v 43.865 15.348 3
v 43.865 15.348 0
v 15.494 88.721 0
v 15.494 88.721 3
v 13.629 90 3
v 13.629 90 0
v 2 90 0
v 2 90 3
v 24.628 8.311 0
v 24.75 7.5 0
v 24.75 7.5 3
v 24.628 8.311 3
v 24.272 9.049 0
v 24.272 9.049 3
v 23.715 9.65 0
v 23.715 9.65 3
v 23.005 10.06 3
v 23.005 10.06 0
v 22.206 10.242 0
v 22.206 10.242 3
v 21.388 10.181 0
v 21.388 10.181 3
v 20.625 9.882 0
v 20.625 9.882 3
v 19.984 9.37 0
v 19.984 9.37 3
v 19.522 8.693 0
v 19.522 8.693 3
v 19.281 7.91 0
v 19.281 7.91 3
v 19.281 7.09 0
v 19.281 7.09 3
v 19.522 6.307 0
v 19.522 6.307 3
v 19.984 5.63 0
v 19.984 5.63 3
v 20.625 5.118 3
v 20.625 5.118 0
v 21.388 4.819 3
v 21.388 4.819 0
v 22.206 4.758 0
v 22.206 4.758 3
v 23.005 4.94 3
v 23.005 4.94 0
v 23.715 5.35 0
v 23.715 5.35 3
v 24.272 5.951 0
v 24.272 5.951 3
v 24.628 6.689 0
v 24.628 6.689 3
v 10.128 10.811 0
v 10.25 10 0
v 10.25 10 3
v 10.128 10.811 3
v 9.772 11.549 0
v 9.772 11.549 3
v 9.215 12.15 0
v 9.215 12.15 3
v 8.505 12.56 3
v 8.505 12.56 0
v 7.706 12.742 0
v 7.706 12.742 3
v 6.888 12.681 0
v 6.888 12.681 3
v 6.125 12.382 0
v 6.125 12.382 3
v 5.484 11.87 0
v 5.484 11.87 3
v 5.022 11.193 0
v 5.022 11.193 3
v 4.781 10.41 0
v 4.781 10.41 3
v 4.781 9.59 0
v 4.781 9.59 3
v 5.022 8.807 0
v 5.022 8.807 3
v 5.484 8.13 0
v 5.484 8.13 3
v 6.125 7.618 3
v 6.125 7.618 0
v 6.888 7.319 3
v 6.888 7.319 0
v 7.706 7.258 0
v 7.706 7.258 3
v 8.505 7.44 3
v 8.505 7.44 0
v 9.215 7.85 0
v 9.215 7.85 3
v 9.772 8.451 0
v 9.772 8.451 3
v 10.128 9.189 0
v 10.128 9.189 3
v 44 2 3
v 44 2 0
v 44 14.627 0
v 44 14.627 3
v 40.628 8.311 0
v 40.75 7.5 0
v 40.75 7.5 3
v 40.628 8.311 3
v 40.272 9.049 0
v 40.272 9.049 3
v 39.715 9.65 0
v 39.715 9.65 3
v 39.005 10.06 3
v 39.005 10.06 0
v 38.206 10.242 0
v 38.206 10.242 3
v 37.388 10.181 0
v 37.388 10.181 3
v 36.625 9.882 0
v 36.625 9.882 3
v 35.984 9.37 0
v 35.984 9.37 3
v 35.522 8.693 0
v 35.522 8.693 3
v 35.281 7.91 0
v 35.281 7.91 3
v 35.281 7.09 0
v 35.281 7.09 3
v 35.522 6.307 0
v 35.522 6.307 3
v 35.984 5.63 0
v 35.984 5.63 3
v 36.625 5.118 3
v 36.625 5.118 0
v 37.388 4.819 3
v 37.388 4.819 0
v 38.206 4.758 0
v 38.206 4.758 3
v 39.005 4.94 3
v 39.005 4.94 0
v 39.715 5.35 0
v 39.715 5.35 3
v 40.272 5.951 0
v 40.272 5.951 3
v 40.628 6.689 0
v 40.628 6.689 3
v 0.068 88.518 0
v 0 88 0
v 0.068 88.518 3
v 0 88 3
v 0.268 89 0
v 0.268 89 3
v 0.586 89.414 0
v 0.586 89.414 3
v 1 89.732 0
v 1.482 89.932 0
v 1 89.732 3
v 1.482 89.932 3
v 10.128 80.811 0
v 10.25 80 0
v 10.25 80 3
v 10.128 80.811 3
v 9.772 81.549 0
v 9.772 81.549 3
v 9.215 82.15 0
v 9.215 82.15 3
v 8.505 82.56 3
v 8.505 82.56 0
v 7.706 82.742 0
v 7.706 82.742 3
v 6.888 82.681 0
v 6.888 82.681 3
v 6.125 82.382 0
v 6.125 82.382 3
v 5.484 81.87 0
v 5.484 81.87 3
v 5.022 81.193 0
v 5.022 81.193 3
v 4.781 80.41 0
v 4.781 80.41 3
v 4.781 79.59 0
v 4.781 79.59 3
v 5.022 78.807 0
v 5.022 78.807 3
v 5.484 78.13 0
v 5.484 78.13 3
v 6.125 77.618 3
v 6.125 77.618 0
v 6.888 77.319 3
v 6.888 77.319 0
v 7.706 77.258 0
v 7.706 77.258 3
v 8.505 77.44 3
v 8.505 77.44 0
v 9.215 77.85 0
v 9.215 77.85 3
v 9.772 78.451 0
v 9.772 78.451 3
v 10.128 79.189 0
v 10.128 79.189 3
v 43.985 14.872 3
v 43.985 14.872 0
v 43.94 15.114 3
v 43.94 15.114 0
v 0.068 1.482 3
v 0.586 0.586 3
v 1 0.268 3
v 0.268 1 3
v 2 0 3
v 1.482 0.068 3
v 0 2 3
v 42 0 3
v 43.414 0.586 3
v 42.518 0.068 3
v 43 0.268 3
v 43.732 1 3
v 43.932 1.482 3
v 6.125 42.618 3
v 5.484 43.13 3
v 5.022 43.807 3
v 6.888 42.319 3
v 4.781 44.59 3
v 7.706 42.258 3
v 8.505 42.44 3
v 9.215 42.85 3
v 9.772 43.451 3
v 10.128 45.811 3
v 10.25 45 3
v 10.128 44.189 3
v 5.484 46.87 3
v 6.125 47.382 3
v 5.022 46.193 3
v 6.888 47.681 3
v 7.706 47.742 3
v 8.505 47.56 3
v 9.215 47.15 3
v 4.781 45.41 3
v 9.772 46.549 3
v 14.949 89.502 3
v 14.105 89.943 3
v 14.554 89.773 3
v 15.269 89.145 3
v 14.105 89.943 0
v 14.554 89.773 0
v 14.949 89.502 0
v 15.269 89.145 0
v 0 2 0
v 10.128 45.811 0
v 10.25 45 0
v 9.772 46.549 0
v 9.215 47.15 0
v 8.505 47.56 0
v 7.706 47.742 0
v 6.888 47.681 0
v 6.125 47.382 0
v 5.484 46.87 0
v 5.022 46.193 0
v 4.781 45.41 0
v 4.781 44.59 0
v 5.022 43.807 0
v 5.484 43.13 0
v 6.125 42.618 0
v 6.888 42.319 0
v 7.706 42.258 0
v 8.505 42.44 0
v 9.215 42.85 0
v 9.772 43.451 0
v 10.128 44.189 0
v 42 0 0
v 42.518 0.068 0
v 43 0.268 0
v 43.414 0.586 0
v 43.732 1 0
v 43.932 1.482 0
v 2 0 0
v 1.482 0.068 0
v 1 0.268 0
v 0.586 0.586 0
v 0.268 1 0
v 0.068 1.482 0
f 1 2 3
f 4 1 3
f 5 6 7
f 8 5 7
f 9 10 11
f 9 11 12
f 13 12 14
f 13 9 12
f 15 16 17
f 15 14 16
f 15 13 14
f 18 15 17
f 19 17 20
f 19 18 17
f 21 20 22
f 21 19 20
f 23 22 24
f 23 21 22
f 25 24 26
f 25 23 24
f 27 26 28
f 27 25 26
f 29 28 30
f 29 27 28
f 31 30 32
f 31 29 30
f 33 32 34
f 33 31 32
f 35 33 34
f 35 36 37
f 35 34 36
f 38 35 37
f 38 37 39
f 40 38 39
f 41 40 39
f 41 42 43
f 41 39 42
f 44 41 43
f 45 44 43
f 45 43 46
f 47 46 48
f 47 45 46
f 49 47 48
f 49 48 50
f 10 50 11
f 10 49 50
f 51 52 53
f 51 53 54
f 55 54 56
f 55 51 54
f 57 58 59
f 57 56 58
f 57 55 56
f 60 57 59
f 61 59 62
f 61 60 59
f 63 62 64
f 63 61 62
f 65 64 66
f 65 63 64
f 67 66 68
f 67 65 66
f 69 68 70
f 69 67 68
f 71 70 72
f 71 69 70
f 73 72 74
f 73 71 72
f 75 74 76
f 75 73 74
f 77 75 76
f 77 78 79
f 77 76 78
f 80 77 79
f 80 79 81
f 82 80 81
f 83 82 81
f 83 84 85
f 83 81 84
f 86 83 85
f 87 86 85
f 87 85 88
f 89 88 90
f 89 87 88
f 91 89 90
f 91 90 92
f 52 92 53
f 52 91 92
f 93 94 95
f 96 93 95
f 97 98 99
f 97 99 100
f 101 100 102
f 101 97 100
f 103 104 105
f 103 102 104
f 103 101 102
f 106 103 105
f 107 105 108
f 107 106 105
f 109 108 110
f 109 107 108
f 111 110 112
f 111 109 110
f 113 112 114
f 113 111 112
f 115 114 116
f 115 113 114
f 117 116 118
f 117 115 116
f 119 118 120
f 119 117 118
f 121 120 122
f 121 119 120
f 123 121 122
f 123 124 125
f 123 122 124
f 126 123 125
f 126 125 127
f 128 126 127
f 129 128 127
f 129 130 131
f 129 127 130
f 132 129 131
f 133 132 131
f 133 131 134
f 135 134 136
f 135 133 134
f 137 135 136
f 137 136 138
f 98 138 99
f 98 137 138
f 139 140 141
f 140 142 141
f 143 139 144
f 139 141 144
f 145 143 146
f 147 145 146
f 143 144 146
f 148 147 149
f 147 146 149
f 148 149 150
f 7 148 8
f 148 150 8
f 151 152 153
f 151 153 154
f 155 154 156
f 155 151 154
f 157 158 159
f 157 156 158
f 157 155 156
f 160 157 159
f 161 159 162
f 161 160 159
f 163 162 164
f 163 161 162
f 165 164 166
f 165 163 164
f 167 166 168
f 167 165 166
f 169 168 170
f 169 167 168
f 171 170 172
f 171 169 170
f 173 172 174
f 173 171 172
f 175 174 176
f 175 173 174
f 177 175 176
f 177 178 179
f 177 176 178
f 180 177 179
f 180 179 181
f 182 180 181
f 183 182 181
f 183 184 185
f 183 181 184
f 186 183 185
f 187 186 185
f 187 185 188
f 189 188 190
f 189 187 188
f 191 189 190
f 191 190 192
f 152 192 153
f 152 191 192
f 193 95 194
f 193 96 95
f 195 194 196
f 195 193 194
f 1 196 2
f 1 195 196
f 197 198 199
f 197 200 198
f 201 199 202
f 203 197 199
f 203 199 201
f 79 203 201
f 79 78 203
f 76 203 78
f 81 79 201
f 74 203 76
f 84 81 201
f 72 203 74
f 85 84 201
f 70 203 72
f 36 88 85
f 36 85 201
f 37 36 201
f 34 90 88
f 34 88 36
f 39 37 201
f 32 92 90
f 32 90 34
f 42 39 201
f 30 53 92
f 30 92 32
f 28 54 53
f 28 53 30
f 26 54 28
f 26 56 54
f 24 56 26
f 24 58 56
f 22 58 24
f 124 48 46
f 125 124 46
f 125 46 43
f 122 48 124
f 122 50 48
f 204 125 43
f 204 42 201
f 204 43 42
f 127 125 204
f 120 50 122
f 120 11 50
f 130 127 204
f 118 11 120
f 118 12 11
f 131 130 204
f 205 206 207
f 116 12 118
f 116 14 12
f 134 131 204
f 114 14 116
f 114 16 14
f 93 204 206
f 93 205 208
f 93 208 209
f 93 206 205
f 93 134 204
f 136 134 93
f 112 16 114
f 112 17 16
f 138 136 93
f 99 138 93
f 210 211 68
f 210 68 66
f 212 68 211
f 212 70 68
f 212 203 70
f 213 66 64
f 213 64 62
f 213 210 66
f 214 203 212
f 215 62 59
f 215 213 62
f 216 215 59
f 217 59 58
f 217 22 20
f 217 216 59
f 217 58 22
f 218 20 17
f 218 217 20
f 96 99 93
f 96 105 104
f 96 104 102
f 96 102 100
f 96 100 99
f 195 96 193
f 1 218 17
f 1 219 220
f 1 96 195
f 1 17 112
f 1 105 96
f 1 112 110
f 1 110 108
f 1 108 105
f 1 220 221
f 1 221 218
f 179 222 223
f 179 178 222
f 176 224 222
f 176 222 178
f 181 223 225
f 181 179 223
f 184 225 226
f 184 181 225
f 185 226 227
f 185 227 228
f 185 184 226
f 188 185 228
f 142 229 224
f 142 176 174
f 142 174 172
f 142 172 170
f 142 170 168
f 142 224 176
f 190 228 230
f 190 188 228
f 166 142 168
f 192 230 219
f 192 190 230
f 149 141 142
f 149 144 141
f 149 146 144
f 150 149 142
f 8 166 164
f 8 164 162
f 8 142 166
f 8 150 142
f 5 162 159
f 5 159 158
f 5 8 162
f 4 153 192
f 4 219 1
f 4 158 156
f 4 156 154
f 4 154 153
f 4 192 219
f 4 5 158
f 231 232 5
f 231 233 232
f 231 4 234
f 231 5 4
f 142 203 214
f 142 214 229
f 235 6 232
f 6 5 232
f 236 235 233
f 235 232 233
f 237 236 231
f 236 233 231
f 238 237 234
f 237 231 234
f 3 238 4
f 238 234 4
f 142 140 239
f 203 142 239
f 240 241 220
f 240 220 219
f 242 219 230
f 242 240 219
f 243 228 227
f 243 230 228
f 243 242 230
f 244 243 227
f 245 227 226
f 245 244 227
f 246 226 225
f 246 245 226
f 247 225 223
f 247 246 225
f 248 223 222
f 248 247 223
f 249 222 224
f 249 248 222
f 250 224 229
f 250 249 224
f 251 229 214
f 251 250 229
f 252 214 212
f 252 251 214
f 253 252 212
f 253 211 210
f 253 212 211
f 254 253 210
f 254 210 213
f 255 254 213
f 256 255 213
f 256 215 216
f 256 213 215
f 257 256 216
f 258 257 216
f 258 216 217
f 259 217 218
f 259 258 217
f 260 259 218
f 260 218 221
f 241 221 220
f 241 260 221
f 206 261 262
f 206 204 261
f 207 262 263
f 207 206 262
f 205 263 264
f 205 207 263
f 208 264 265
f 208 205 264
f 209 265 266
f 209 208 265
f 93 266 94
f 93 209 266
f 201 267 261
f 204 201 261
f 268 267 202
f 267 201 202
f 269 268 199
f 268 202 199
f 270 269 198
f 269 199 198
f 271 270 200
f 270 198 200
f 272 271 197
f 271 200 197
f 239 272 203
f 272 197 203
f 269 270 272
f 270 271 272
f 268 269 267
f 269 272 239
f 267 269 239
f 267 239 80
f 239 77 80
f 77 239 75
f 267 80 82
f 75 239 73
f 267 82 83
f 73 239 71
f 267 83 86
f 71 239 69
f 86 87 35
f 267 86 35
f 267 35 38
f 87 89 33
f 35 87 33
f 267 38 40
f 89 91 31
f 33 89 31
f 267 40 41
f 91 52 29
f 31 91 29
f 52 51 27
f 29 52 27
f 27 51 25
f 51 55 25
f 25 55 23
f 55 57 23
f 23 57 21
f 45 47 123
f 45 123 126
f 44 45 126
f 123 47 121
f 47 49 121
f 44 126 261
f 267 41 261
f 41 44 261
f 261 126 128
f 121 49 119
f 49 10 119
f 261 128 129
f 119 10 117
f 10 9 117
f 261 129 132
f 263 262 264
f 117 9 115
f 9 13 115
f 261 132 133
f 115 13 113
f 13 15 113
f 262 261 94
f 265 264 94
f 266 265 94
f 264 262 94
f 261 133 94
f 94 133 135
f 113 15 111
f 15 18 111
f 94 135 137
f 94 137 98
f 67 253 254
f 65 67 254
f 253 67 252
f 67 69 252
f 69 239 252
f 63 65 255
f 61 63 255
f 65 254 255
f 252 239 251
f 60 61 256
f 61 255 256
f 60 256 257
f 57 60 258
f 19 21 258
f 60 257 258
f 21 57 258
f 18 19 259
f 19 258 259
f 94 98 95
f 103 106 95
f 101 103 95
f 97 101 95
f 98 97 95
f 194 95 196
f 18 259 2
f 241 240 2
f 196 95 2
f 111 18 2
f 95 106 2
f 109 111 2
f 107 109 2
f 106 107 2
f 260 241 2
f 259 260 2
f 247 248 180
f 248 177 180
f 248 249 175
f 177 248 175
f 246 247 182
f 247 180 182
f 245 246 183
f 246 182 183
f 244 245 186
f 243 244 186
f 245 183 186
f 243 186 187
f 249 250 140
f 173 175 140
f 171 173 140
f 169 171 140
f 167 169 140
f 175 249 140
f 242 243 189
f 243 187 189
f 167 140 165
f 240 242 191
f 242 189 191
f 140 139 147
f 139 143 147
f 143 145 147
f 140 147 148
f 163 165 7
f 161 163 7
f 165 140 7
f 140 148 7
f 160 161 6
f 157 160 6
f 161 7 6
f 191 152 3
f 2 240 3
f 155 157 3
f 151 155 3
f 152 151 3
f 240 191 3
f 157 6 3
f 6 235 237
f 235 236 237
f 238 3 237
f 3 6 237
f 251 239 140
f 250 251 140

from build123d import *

# Parameters (mm, degrees)
BOSS_EXTRU_1_DEPTH           = 3
ENL_V_MAT_EXTRU_1_DEPTH      = 101.224747443
ENL_V_MAT_EXTRU_1_DEPTH_BACK = 101.224747443
ESQUISSE2_R                  = 2.75
CONG_1_R                     = 2


with BuildPart() as part:
    # Esquisse1 → Boss.-Extru.1 (new body)
    with BuildSketch(Plane.XY):
        Polygon((0, 0), (44, 0), (44, 15), (15, 90), (0, 90), align=None)
    extrude(amount=BOSS_EXTRU_1_DEPTH)

    # Esquisse2 → Enlèv. mat.-Extru.1 (cut, two sides: drawn at the far end of the back side and taken through both)
    with BuildSketch(Plane.XY.offset(3).offset(-ENL_V_MAT_EXTRU_1_DEPTH_BACK)):
        with Locations((7.5, 10)):
            Circle(ESQUISSE2_R)
        with Locations((7.5, 45)):
            Circle(ESQUISSE2_R)
        with Locations((7.5, 80)):
            Circle(ESQUISSE2_R)
        with Locations((22, 7.5)):
            Circle(ESQUISSE2_R)
        with Locations((38, 7.5)):
            Circle(ESQUISSE2_R)
    extrude(amount=ENL_V_MAT_EXTRU_1_DEPTH + ENL_V_MAT_EXTRU_1_DEPTH_BACK, mode=Mode.SUBTRACT)

    # Congé1
    cong_1_edges = [part.edges().sort_by_distance(p)[0] for p in [
        (0, 90, 1.5),
        (15, 90, 1.5),
        (44, 15, 1.5),
        (44, 0, 1.5),
        (0, 0, 1.5),
    ]]
    fillet(cong_1_edges, radius=CONG_1_R)


solid = part.part
